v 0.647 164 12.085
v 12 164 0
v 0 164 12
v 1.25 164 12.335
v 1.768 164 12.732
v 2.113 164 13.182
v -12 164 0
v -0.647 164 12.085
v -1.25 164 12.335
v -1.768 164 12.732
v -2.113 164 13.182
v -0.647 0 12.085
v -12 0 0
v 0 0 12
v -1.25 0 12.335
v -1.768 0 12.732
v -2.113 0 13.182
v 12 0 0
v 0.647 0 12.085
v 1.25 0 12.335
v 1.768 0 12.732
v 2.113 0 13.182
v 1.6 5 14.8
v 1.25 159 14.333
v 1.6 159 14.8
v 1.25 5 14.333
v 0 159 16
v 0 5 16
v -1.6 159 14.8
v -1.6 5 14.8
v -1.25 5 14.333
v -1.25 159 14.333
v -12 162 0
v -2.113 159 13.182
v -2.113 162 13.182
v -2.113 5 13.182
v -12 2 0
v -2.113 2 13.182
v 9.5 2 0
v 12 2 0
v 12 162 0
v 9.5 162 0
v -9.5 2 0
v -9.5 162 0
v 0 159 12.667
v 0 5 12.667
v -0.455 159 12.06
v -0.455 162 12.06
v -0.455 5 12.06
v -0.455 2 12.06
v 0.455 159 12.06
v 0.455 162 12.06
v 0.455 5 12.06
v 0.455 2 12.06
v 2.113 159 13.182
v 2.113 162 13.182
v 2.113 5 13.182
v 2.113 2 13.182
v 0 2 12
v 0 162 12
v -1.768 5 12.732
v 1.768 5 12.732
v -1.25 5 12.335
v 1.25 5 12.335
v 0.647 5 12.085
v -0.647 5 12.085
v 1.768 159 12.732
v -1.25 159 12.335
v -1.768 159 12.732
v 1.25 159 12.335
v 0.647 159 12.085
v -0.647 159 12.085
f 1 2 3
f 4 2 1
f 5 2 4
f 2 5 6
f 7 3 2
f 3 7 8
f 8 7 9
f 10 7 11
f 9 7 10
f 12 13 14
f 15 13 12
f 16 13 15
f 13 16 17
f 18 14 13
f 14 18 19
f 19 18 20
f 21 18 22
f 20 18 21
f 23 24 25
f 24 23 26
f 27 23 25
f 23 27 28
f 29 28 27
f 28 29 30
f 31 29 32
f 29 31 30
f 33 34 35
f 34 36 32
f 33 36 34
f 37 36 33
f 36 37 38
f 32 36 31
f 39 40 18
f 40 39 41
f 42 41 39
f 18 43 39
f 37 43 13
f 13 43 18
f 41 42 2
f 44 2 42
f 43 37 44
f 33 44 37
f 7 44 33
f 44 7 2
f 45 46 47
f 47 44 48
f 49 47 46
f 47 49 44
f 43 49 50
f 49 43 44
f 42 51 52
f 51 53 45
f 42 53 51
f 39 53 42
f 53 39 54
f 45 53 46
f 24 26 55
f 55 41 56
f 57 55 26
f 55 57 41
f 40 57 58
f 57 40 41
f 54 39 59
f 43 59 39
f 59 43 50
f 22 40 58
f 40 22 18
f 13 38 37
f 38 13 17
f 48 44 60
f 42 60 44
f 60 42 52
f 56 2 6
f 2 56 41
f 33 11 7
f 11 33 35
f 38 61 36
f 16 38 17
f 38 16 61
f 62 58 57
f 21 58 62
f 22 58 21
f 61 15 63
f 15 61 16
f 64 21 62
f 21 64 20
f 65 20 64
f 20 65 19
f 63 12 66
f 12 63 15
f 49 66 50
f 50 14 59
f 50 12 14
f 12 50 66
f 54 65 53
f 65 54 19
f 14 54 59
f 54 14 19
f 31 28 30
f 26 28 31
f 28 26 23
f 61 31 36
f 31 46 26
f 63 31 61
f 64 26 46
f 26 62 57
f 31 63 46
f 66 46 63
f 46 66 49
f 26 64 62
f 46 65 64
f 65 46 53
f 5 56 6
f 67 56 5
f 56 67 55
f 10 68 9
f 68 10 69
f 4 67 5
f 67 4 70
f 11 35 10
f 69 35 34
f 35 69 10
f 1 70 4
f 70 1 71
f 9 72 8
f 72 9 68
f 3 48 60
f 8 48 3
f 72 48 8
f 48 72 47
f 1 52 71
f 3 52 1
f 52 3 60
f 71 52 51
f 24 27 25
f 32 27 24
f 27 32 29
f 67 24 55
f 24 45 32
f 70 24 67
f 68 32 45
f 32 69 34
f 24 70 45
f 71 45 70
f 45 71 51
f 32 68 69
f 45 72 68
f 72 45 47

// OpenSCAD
// ============================================================================
// Daszek "Morph" - dwa pochyle daszki (profil "Lambda"), puste pod spodem,
//   zamkniete na koncach trojkatnymi sciankami czolowymi z nacieciem na szczycie.
// ----------------------------------------------------------------------------
// Konstrukcja (wg zdjec z Dysku Google, folder Morph):
//   - dwa panele dachu (lewy + prawy) o grubosci "grubosc_scianki", spotykaja
//     sie na kalenicy; POD SPODEM PUSTE (bez dna, bez podstawy),
//   - na obu koncach pelna trojkatna ScIANKA CZOLOWA (szczyt) zamykajaca profil,
//   - w szczycie kazdego czola polokragle NACIECIE (jak na zdjeciu konca czesci).
// Material: PETG, druk FDM. Jednostki: milimetry.
// Orientacja druku: podstawa na stole, kalenica do gory - bez podpor.
// Wersja jednoplikowa (biblioteka na dole) - dziala tez w OpenSCAD Playground.
// Data: 2026-08-21
// ============================================================================

/* [Co renderowac] */
czesc = "wszystko"; // [wszystko, daszek, plyta_druku]

/* [Wymiary glowne] */
// dlugosc calego daszka (wzdluz osi) [mm]
dlugosc = 164;              // [40:1:400]
// rozstaw dolnych krawedzi (szerokosc u podstawy) [mm]
szerokosc_podstawy = 24;    // [10:0.5:80]
// dlugosc pochylej scianki - jednego daszka / spadku [mm]
skrzydlo = 20;              // [8:0.5:60]
// grubosc paneli dachu [mm]
grubosc_scianki = 2.0;      // [1.2:0.1:5]

/* [Scianki czolowe (szczyty)] */
// czy zamykac konce trojkatna scianka czolowa
czolo_wl = true;            // [true, false]
// scianki na obu koncach? (false = tylko poczatek)
czolo_oba = true;           // [true, false]
// grubosc scianki czolowej [mm]
grubosc_czola = 2.0;        // [1.2:0.1:6]

/* [Naciecie na szczycie czola] */
// szerokosc naciecia (srednica polokragla) [mm]
naciecie_szerokosc = 5;     // [2:0.5:30]
// glebokosc naciecia liczona od szczytu w dol [mm]
naciecie_glebokosc = 4;     // [1:0.5:30]
// jak gleboko naciecie wchodzi w kalenice za czolem [mm]
naciecie_zasieg = 3;        // [0:0.5:30]

/* [Kalibracja drukarki] */
// globalna korekta wymiaru (jesli czesci wychodza za male/za duze) [mm]
KOREKTA = 0.0;              // [-0.3:0.05:0.3]

/* [Jakosc] */
// maksymalny blad cieciwy dla lukow - mniej = gladziej, wolniej [mm]
BLAD_CIECIWY = 0.05;        // [0.02:0.01:0.2]

/* [Hidden] */
EPS = 0.01;                 // maly zapas na operacje boolowskie

// --- wartosci pochodne (obliczane) --------------------------------------
b   = szerokosc_podstawy + KOREKTA;   // podstawa
sk  = skrzydlo;                       // dlugosc spadku
t   = grubosc_scianki;                // grubosc panelu
gc  = grubosc_czola;                  // grubosc czola
// wysokosc trojkata (spadek^2 = wysokosc^2 + (b/2)^2)
wys = sqrt(max(0.01, sk*sk - (b/2)*(b/2)));
// jednostkowy wektor "do wnetrza" dla prawego panelu (prostopadly do spadku)
nx = -wys / sk;
ny = -(b/2) / sk;

echo(str("Daszek: dlugosc=", dlugosc, " podstawa=", b,
         " skrzydlo=", sk, " wysokosc=", wys, " panel=", t, " czolo=", gc));

// ============================================================================
// MODULY
// ============================================================================

// Prawy panel dachu (2D): pas o grubosci t wzdluz prawego spadku
module bar_prawy() {
    polygon([
        [b/2,            0],              // dolny naroznik zewnetrzny
        [0,              wys],            // kalenica (zewnatrz)
        [t*nx,           wys + t*ny],     // kalenica (wewnatrz)
        [b/2 + t*nx,     t*ny]            // dolny naroznik wewnetrzny
    ]);
}

// Profil dachu (2D): lewy + prawy panel, przyciete plasko u dolu (y>=0)
module profil_daszek() {
    intersection() {
        union() {
            bar_prawy();
            mirror([1, 0, 0]) bar_prawy();
        }
        translate([-1000, 0]) square([2000, 1000]);   // odetnij ponizej podstawy
    }
}

// Pelny trojkat (2D) - ksztalt scianki czolowej
module trojkat_pelny() {
    polygon([[-b/2, 0], [b/2, 0], [0, wys]]);
}

// Dach na calej dlugosci, kalenica do gory, dlugosc wzdluz Y (0..dlugosc)
module korpus_daszek() {
    translate([0, dlugosc, 0])
        rotate([90, 0, 0])
            linear_extrude(height = dlugosc)
                profil_daszek();
}

// Scianka czolowa przy poczatku (y: 0..gc)
module czolo_y0() {
    translate([0, gc, 0])
        rotate([90, 0, 0])
            linear_extrude(height = gc)
                trojkat_pelny();
}

// Scianka czolowa przy koncu (y: dlugosc-gc..dlugosc)
module czolo_y1() {
    translate([0, dlugosc, 0])
        rotate([90, 0, 0])
            linear_extrude(height = gc)
                trojkat_pelny();
}

// Naciecie w szczycie: polokragly rowek od gory, przez czolo i kawalek kalenicy.
// y0 = poczatek wzdluz osi, dl = dlugosc rowka wzdluz osi
module naciecie_szczyt(y0, dl) {
    rr = min(naciecie_szerokosc / 2, naciecie_glebokosc);   // promien dna
    z0 = wys - naciecie_glebokosc + rr;                     // srodek luku dna
    union() {
        // zaokraglone dno (walec lezacy wzdluz Y)
        translate([0, y0, z0])
            rotate([-90, 0, 0])
                cylinder(h = dl, r = rr, $fn = fn_walec(rr));
        // proste scianki rowka az ponad kalenice
        translate([-rr, y0, z0])
            cube([2 * rr, dl, (wys - z0) + 2]);
    }
}

// Gotowy daszek
module daszek() {
    dl0 = gc + naciecie_zasieg + EPS;      // dlugosc naciecia od konca
    difference() {
        union() {
            korpus_daszek();
            if (czolo_wl) czolo_y0();
            if (czolo_wl && czolo_oba) czolo_y1();
        }
        if (czolo_wl) {
            naciecie_szczyt(-EPS, dl0);                       // naciecie na poczatku
            if (czolo_oba)
                naciecie_szczyt(dlugosc - dl0 + EPS, dl0);    // naciecie na koncu
        }
    }
}

// Ulozenie na stole druku (czesc juz stoi podstawa na Z=0)
module plyta_druku() {
    daszek();
}

// ============================================================================
// WYWOLANIE
// ============================================================================
if (czesc == "wszystko" || czesc == "daszek") daszek();
else if (czesc == "plyta_druku") plyta_druku();

// ============================================================================
// ===== BIBLIOTEKA (wklejona, nie edytuj) =====
// Funkcje jakosci siatki - dobieraja $fn z bledu cieciwy, nigdy sztywne $fn.
// ============================================================================

// liczba segmentow walca/luku o promieniu r przy zadanym bledzie cieciwy
function fn_walec(r) =
    (r <= BLAD_CIECIWY)
        ? 24
        : max(24, ceil(180 / acos(1 - BLAD_CIECIWY / r)));
